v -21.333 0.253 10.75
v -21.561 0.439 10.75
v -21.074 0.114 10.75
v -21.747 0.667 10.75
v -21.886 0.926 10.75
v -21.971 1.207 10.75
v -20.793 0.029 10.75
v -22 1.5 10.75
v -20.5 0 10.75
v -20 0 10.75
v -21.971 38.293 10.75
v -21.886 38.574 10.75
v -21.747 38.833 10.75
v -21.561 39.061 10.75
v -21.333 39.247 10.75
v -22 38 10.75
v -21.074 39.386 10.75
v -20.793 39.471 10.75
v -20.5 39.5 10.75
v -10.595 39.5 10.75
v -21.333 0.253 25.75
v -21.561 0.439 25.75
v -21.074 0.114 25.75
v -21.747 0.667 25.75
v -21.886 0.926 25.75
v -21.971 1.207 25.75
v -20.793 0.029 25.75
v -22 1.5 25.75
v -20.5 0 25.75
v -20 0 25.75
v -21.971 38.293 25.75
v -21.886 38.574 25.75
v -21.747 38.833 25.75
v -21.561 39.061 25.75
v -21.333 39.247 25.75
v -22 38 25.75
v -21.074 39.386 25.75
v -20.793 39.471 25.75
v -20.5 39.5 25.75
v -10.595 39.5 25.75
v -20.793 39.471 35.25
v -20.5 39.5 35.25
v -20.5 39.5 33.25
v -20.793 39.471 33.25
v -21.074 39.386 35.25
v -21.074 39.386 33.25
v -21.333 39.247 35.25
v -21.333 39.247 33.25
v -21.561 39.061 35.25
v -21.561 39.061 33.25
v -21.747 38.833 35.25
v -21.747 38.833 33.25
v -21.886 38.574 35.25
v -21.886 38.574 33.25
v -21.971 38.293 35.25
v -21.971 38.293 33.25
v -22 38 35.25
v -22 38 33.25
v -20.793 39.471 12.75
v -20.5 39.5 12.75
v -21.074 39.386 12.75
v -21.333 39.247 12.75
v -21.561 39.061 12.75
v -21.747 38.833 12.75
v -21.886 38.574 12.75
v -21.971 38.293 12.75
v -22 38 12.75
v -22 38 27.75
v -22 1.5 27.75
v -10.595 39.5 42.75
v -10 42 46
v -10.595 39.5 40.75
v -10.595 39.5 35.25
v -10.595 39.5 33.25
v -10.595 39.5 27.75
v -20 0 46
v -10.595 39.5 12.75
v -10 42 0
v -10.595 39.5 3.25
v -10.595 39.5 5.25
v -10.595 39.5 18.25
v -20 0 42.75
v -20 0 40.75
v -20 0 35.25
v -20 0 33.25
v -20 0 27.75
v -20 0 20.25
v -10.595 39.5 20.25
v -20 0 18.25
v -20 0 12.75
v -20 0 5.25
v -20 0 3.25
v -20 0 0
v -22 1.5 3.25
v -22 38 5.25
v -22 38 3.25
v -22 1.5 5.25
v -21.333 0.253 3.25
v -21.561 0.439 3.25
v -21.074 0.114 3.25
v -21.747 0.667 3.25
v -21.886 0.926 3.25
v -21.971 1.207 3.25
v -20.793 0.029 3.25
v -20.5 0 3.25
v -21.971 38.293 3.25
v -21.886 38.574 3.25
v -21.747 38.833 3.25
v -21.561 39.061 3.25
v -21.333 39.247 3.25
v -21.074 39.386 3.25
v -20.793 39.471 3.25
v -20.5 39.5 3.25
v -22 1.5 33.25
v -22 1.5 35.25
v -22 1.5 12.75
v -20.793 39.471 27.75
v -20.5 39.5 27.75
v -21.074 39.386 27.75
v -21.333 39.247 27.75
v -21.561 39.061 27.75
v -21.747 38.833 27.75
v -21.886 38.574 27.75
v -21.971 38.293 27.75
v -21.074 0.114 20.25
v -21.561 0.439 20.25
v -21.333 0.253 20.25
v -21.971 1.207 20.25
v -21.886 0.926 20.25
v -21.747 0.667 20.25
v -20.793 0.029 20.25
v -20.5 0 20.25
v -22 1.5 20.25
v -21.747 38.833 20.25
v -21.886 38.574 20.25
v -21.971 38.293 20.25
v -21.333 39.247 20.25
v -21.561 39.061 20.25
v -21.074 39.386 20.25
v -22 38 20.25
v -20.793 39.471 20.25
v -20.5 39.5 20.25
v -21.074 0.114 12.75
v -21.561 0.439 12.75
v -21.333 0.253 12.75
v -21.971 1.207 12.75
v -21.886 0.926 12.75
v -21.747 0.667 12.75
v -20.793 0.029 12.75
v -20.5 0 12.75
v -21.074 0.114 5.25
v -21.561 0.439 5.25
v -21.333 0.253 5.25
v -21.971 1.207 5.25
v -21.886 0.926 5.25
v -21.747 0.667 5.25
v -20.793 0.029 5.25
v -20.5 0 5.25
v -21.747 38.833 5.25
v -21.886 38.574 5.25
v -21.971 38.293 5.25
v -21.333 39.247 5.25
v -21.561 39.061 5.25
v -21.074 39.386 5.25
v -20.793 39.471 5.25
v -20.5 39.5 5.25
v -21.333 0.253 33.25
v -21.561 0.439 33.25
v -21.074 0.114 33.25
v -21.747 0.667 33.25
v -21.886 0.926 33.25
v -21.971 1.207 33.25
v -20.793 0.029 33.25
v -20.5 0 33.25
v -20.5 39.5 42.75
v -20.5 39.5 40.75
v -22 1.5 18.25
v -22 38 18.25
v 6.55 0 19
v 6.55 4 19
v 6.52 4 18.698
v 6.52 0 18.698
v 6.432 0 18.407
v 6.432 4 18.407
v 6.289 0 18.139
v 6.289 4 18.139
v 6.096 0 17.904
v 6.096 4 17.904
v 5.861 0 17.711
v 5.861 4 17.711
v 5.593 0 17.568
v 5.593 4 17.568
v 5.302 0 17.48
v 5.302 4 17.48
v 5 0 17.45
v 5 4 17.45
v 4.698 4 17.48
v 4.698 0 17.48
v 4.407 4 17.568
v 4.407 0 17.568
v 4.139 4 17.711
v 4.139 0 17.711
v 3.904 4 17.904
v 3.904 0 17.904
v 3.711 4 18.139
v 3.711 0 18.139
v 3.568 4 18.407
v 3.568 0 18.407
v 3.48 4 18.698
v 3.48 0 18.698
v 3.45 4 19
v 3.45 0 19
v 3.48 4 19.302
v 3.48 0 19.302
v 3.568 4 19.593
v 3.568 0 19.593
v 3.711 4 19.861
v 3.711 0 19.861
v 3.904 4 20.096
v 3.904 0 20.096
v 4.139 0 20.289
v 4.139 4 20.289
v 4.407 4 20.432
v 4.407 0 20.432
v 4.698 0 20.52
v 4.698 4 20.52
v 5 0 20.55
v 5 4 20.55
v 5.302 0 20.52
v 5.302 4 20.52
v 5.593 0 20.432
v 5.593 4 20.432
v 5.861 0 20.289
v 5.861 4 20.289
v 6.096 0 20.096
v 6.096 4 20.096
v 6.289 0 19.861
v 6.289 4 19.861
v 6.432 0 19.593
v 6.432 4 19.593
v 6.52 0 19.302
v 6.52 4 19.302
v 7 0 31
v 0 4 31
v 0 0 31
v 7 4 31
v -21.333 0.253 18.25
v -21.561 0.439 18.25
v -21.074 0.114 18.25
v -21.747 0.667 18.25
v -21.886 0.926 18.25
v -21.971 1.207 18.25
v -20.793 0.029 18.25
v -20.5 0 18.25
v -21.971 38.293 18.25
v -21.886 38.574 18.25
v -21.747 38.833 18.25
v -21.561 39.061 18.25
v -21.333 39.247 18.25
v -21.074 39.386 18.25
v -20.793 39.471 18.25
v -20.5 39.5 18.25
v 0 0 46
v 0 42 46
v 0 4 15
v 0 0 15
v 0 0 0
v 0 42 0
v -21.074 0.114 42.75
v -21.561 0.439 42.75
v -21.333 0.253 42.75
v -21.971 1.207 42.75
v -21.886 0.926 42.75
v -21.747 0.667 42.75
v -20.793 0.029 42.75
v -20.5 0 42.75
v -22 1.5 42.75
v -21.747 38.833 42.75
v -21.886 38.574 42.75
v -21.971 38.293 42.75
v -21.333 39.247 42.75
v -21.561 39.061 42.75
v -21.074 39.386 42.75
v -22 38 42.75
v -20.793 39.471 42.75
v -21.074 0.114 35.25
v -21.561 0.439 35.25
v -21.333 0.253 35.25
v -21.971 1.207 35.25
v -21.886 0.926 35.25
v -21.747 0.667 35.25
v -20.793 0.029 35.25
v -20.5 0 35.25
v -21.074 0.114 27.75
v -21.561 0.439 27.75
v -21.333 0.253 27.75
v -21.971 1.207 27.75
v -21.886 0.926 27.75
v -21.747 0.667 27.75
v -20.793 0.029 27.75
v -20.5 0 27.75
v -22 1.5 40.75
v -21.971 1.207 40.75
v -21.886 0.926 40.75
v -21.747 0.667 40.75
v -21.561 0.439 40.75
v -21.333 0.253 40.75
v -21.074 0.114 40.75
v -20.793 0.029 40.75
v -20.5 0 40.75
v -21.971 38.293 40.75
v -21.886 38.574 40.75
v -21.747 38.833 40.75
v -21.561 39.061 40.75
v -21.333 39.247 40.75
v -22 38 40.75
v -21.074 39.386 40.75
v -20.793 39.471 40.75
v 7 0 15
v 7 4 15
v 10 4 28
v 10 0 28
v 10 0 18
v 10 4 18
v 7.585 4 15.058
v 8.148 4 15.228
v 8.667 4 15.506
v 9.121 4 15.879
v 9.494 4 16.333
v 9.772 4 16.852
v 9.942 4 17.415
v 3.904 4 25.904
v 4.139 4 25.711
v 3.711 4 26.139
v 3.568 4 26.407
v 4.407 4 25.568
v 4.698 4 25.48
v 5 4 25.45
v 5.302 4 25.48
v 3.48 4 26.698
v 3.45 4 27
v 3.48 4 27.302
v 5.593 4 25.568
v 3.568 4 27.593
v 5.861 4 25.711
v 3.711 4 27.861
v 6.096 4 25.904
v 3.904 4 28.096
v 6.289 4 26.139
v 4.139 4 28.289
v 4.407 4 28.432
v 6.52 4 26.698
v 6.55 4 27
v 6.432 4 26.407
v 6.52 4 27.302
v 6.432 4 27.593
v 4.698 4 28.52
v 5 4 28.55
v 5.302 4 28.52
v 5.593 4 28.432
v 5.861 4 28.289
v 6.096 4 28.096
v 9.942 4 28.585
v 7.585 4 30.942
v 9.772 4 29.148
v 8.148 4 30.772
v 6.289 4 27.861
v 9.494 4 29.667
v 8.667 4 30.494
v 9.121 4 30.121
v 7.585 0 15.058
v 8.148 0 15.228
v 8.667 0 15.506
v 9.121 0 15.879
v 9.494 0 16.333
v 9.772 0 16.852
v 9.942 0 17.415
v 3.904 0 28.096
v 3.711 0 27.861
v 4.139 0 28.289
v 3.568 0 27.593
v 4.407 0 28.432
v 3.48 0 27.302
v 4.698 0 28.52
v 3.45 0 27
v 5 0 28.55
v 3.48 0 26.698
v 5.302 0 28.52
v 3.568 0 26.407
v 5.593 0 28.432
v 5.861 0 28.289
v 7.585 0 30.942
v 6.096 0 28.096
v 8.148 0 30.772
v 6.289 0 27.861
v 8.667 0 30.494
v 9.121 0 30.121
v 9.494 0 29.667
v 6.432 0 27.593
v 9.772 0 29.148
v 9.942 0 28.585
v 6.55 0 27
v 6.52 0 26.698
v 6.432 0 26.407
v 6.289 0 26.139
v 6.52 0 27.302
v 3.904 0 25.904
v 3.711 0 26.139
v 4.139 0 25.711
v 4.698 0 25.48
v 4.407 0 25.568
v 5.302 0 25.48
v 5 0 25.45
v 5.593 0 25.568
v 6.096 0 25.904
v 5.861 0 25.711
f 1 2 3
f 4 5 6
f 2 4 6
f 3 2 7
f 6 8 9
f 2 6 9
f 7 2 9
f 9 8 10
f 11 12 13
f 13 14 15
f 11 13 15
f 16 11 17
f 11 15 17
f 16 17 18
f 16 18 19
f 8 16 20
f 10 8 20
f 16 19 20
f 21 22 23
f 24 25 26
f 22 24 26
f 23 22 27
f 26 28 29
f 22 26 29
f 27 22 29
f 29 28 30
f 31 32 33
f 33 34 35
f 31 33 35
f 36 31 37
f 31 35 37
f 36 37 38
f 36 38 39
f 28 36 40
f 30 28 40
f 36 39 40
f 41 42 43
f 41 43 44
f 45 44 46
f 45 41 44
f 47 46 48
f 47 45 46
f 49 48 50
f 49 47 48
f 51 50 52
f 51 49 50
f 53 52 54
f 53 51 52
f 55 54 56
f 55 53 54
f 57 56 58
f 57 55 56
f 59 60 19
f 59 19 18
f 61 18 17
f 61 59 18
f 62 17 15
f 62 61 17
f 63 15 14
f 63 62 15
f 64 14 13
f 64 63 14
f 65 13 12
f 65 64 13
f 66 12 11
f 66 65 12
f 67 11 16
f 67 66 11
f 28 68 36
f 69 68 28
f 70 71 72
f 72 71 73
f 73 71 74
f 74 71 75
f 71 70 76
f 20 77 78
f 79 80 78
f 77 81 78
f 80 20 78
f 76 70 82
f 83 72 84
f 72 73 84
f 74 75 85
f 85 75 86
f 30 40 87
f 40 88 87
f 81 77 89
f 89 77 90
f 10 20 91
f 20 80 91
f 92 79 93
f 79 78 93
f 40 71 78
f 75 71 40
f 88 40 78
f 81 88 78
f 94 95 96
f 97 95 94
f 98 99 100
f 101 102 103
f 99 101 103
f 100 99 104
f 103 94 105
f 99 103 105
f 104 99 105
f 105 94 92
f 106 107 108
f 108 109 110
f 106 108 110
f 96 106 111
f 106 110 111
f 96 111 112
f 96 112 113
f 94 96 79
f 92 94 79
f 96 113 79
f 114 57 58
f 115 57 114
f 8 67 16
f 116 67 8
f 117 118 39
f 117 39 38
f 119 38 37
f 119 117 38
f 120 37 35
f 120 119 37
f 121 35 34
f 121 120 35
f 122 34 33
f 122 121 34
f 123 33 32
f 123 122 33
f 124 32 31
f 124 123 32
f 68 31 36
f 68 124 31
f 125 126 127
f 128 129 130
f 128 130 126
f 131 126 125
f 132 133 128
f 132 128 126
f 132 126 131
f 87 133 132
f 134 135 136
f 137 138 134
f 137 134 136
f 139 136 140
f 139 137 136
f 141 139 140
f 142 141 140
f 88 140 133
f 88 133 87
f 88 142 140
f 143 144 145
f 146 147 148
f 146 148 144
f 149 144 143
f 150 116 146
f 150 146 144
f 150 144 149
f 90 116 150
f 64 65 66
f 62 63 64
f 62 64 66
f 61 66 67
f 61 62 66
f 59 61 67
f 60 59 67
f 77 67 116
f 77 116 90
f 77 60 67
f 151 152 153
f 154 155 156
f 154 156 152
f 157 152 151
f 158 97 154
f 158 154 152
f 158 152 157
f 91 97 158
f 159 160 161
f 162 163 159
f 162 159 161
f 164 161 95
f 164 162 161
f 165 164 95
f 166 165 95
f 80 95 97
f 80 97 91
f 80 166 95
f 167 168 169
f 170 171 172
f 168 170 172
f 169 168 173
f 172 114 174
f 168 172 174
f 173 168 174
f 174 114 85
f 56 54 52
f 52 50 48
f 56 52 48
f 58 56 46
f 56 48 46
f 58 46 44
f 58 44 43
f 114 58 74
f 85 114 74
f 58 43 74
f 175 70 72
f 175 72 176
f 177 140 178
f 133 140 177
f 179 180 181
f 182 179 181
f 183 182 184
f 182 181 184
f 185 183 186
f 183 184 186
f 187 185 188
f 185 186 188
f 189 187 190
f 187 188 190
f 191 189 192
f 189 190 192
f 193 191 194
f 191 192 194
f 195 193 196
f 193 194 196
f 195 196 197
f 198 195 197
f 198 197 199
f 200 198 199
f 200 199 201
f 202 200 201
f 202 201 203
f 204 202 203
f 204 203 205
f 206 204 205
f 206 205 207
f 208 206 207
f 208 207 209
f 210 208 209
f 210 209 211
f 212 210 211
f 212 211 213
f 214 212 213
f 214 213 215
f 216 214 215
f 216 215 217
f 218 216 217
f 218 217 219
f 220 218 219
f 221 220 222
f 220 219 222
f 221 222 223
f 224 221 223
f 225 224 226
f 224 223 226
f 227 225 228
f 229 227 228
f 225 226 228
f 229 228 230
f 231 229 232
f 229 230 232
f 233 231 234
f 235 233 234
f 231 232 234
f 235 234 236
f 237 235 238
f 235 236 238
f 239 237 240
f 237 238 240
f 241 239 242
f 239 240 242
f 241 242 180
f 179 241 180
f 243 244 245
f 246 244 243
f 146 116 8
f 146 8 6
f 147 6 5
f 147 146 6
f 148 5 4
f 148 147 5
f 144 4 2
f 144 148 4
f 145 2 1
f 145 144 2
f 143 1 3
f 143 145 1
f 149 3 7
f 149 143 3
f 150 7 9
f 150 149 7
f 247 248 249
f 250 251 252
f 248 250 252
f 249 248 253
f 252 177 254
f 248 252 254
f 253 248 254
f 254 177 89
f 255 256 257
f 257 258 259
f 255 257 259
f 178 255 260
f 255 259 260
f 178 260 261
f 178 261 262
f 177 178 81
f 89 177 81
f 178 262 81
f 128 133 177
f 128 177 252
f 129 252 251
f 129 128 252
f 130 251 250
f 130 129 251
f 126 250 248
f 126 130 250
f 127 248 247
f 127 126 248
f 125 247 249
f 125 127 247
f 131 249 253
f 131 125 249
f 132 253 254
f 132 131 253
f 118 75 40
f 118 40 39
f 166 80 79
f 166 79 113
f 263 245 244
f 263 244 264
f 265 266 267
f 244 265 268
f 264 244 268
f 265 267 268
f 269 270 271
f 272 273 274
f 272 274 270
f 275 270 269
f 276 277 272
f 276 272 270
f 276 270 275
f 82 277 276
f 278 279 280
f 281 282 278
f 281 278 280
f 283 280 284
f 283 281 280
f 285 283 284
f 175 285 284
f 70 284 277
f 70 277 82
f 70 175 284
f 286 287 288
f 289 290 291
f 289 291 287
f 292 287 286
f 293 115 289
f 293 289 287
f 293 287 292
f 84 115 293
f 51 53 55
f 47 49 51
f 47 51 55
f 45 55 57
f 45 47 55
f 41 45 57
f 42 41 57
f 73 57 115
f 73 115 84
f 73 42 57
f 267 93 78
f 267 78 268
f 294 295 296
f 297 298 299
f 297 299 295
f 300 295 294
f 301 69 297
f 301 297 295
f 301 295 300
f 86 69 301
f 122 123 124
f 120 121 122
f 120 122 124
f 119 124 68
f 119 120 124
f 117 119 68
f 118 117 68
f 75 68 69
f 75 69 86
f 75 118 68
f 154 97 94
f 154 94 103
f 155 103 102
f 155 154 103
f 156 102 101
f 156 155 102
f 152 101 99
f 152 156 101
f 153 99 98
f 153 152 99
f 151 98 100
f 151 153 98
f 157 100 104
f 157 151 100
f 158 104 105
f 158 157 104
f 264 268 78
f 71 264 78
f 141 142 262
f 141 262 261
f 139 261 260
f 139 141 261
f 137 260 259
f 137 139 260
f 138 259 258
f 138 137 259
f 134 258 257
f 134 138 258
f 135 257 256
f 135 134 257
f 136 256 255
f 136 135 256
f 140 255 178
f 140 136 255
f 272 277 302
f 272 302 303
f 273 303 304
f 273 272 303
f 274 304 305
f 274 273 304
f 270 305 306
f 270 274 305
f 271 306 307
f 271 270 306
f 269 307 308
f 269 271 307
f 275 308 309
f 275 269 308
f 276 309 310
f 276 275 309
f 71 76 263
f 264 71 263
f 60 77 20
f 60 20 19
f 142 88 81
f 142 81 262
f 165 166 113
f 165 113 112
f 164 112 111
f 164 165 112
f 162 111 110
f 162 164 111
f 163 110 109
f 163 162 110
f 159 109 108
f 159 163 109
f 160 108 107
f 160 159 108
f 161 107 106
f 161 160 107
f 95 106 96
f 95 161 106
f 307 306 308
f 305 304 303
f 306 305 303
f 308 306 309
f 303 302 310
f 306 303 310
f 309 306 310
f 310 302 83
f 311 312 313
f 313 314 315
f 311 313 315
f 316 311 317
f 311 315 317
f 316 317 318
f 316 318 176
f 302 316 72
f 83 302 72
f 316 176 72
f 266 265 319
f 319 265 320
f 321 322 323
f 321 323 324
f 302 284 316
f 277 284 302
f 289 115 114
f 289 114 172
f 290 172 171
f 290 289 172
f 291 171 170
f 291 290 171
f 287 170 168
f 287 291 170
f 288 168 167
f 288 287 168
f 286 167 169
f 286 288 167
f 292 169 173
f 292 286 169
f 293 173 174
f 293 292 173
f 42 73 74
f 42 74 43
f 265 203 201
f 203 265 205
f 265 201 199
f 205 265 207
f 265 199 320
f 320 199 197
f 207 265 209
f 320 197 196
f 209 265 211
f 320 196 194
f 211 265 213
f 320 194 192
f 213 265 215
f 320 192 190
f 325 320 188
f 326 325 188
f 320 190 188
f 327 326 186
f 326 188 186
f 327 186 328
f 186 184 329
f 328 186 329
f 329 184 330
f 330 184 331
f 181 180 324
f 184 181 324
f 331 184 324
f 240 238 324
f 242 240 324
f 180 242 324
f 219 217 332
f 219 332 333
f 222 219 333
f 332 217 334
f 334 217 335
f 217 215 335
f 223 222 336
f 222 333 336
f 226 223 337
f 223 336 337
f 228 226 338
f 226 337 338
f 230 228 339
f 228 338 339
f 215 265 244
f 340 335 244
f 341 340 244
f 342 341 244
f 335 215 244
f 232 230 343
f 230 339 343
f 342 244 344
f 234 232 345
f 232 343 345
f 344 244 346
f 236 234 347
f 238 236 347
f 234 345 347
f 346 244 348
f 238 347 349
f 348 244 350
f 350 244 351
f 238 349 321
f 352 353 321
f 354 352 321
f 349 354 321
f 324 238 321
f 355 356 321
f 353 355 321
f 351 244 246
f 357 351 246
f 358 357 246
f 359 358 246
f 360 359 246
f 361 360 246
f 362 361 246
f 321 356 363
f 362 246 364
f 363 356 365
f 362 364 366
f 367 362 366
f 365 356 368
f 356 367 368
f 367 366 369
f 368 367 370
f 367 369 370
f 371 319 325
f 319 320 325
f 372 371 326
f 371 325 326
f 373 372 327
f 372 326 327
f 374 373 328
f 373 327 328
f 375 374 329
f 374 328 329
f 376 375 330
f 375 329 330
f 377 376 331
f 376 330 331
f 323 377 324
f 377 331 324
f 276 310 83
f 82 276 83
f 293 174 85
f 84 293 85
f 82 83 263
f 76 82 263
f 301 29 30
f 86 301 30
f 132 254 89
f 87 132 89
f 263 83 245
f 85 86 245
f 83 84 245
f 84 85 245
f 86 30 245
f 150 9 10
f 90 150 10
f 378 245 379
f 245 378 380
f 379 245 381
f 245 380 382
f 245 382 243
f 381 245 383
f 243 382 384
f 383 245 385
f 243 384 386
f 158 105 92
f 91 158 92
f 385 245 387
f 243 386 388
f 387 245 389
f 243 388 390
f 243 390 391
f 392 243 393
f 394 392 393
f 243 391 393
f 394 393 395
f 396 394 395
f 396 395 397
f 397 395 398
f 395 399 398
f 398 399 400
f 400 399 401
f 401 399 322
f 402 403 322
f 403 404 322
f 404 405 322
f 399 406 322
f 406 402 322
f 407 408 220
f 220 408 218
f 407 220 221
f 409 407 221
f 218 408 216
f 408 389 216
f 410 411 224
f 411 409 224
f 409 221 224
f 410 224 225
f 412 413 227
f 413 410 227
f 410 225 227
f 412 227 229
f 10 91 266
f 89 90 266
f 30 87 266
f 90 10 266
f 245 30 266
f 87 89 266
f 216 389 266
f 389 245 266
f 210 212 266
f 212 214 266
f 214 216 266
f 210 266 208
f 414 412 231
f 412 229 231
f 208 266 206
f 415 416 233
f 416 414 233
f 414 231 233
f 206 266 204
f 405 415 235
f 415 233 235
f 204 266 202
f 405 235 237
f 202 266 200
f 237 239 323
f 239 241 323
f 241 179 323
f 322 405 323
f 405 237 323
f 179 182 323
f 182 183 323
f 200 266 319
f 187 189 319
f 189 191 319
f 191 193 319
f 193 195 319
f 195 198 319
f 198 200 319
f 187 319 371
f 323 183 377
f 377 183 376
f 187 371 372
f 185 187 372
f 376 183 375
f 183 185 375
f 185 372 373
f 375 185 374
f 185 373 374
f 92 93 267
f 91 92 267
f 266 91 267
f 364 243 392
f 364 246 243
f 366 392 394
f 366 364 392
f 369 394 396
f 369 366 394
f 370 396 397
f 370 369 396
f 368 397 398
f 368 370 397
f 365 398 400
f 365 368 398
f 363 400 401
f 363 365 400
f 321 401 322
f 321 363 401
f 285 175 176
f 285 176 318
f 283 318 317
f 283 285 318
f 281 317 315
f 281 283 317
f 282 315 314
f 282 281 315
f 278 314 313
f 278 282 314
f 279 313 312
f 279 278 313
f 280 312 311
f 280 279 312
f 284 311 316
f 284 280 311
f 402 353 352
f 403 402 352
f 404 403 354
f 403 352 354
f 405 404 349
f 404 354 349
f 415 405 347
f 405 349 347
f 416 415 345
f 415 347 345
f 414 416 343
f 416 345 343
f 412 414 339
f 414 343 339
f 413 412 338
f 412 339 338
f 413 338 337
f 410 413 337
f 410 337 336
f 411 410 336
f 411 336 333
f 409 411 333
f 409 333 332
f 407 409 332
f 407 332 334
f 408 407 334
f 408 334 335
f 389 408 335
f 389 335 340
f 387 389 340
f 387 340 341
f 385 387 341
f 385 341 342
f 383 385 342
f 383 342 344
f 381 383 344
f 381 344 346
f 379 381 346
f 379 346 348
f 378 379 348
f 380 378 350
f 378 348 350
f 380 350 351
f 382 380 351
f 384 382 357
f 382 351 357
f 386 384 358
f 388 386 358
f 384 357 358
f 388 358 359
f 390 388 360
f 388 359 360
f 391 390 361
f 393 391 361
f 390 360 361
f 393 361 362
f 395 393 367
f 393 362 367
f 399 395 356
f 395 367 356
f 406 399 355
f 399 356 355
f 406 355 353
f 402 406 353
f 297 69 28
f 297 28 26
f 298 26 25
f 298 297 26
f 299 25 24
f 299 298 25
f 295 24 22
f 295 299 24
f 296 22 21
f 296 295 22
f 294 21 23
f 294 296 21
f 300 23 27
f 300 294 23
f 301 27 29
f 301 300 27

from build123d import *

# Parameters (mm, degrees)
BOSS_EXTRUDE1_DEPTH = 46
BOSS_EXTRUDE2_DEPTH = 2
LPATTERN1_COUNT     = 6
LPATTERN1_PITCH     = 7.5
SKETCH3_W           = 10
SKETCH3_H           = 4
BOSS_EXTRUDE3_DEPTH = 8
CUT_EXTRUDE1_REACH  = 6
SKETCH4_R           = 1.55
FILLET1_R           = 3


with BuildPart() as part:
    # Sketch1 → Boss-Extrude1 (new body)
    with BuildSketch(Plane.XY):
        Polygon((0, 0), (0, 42), (-10, 42), (-20, 0), align=None)
    extrude(amount=BOSS_EXTRUDE1_DEPTH)

    # Sketch2 → Boss-Extrude2 (add)
    with BuildSketch(Plane.XY.offset(42.75)):
        with BuildLine():
            Line((-10.595238095, 39.5), (-20.5, 39.5))
            ThreePointArc((-20.5, 39.5), (-21.560660172, 39.060660172), (-22, 38))
            Line((-22, 38), (-22, 1.5))
            ThreePointArc((-22, 1.5), (-21.560660172, 0.439339828), (-20.5, 0))
            Line((-20.5, 0), (-20, 0))
            Line((-20, 0), (-10.595238095, 39.5))
        make_face()
    boss_extrude2 = extrude(amount=-BOSS_EXTRUDE2_DEPTH)

    # LPattern1: Boss-Extrude2 ×6
    with Locations(*[(0, 0, -i * LPATTERN1_PITCH) for i in range(1, LPATTERN1_COUNT)]):
        add(boss_extrude2)

    # Sketch3 → Boss-Extrude3 (add, symmetric)
    with BuildSketch(Plane.XY.offset(23)):
        with Locations((5, 2)):
            Rectangle(SKETCH3_W, SKETCH3_H)
    extrude(amount=BOSS_EXTRUDE3_DEPTH, both=True)

    # Sketch4 → Cut-Extrude1 (cut, up to next)
    with BuildSketch(Plane(origin=(0, 4, 0), x_dir=(1, 0, 0), z_dir=(0, 1, 0)), mode=Mode.PRIVATE) as cut_extrude1_sk1:
        with Locations((5, -19)):
            Circle(SKETCH4_R)
    cut_extrude1_tool1 = extrude(cut_extrude1_sk1.sketch, amount=-CUT_EXTRUDE1_REACH, mode=Mode.PRIVATE) & part.part
    add(cut_extrude1_tool1.solids().sort_by_distance((5, 4, 19))[0], mode=Mode.SUBTRACT)
    # Sketch4 → Cut-Extrude1 (cut, up to next)
    with BuildSketch(Plane(origin=(0, 4, 0), x_dir=(1, 0, 0), z_dir=(0, 1, 0)), mode=Mode.PRIVATE) as cut_extrude1_sk2:
        with Locations((5, -27)):
            Circle(SKETCH4_R)
    cut_extrude1_tool2 = extrude(cut_extrude1_sk2.sketch, amount=-CUT_EXTRUDE1_REACH, mode=Mode.PRIVATE) & part.part
    add(cut_extrude1_tool2.solids().sort_by_distance((5, 4, 27))[0], mode=Mode.SUBTRACT)

    # Fillet1
    fillet1_edges = [part.edges().sort_by_distance(p)[0] for p in [
        (10, 2, 15),
        (10, 2, 31),
    ]]
    fillet(fillet1_edges, radius=FILLET1_R)


solid = part.part
